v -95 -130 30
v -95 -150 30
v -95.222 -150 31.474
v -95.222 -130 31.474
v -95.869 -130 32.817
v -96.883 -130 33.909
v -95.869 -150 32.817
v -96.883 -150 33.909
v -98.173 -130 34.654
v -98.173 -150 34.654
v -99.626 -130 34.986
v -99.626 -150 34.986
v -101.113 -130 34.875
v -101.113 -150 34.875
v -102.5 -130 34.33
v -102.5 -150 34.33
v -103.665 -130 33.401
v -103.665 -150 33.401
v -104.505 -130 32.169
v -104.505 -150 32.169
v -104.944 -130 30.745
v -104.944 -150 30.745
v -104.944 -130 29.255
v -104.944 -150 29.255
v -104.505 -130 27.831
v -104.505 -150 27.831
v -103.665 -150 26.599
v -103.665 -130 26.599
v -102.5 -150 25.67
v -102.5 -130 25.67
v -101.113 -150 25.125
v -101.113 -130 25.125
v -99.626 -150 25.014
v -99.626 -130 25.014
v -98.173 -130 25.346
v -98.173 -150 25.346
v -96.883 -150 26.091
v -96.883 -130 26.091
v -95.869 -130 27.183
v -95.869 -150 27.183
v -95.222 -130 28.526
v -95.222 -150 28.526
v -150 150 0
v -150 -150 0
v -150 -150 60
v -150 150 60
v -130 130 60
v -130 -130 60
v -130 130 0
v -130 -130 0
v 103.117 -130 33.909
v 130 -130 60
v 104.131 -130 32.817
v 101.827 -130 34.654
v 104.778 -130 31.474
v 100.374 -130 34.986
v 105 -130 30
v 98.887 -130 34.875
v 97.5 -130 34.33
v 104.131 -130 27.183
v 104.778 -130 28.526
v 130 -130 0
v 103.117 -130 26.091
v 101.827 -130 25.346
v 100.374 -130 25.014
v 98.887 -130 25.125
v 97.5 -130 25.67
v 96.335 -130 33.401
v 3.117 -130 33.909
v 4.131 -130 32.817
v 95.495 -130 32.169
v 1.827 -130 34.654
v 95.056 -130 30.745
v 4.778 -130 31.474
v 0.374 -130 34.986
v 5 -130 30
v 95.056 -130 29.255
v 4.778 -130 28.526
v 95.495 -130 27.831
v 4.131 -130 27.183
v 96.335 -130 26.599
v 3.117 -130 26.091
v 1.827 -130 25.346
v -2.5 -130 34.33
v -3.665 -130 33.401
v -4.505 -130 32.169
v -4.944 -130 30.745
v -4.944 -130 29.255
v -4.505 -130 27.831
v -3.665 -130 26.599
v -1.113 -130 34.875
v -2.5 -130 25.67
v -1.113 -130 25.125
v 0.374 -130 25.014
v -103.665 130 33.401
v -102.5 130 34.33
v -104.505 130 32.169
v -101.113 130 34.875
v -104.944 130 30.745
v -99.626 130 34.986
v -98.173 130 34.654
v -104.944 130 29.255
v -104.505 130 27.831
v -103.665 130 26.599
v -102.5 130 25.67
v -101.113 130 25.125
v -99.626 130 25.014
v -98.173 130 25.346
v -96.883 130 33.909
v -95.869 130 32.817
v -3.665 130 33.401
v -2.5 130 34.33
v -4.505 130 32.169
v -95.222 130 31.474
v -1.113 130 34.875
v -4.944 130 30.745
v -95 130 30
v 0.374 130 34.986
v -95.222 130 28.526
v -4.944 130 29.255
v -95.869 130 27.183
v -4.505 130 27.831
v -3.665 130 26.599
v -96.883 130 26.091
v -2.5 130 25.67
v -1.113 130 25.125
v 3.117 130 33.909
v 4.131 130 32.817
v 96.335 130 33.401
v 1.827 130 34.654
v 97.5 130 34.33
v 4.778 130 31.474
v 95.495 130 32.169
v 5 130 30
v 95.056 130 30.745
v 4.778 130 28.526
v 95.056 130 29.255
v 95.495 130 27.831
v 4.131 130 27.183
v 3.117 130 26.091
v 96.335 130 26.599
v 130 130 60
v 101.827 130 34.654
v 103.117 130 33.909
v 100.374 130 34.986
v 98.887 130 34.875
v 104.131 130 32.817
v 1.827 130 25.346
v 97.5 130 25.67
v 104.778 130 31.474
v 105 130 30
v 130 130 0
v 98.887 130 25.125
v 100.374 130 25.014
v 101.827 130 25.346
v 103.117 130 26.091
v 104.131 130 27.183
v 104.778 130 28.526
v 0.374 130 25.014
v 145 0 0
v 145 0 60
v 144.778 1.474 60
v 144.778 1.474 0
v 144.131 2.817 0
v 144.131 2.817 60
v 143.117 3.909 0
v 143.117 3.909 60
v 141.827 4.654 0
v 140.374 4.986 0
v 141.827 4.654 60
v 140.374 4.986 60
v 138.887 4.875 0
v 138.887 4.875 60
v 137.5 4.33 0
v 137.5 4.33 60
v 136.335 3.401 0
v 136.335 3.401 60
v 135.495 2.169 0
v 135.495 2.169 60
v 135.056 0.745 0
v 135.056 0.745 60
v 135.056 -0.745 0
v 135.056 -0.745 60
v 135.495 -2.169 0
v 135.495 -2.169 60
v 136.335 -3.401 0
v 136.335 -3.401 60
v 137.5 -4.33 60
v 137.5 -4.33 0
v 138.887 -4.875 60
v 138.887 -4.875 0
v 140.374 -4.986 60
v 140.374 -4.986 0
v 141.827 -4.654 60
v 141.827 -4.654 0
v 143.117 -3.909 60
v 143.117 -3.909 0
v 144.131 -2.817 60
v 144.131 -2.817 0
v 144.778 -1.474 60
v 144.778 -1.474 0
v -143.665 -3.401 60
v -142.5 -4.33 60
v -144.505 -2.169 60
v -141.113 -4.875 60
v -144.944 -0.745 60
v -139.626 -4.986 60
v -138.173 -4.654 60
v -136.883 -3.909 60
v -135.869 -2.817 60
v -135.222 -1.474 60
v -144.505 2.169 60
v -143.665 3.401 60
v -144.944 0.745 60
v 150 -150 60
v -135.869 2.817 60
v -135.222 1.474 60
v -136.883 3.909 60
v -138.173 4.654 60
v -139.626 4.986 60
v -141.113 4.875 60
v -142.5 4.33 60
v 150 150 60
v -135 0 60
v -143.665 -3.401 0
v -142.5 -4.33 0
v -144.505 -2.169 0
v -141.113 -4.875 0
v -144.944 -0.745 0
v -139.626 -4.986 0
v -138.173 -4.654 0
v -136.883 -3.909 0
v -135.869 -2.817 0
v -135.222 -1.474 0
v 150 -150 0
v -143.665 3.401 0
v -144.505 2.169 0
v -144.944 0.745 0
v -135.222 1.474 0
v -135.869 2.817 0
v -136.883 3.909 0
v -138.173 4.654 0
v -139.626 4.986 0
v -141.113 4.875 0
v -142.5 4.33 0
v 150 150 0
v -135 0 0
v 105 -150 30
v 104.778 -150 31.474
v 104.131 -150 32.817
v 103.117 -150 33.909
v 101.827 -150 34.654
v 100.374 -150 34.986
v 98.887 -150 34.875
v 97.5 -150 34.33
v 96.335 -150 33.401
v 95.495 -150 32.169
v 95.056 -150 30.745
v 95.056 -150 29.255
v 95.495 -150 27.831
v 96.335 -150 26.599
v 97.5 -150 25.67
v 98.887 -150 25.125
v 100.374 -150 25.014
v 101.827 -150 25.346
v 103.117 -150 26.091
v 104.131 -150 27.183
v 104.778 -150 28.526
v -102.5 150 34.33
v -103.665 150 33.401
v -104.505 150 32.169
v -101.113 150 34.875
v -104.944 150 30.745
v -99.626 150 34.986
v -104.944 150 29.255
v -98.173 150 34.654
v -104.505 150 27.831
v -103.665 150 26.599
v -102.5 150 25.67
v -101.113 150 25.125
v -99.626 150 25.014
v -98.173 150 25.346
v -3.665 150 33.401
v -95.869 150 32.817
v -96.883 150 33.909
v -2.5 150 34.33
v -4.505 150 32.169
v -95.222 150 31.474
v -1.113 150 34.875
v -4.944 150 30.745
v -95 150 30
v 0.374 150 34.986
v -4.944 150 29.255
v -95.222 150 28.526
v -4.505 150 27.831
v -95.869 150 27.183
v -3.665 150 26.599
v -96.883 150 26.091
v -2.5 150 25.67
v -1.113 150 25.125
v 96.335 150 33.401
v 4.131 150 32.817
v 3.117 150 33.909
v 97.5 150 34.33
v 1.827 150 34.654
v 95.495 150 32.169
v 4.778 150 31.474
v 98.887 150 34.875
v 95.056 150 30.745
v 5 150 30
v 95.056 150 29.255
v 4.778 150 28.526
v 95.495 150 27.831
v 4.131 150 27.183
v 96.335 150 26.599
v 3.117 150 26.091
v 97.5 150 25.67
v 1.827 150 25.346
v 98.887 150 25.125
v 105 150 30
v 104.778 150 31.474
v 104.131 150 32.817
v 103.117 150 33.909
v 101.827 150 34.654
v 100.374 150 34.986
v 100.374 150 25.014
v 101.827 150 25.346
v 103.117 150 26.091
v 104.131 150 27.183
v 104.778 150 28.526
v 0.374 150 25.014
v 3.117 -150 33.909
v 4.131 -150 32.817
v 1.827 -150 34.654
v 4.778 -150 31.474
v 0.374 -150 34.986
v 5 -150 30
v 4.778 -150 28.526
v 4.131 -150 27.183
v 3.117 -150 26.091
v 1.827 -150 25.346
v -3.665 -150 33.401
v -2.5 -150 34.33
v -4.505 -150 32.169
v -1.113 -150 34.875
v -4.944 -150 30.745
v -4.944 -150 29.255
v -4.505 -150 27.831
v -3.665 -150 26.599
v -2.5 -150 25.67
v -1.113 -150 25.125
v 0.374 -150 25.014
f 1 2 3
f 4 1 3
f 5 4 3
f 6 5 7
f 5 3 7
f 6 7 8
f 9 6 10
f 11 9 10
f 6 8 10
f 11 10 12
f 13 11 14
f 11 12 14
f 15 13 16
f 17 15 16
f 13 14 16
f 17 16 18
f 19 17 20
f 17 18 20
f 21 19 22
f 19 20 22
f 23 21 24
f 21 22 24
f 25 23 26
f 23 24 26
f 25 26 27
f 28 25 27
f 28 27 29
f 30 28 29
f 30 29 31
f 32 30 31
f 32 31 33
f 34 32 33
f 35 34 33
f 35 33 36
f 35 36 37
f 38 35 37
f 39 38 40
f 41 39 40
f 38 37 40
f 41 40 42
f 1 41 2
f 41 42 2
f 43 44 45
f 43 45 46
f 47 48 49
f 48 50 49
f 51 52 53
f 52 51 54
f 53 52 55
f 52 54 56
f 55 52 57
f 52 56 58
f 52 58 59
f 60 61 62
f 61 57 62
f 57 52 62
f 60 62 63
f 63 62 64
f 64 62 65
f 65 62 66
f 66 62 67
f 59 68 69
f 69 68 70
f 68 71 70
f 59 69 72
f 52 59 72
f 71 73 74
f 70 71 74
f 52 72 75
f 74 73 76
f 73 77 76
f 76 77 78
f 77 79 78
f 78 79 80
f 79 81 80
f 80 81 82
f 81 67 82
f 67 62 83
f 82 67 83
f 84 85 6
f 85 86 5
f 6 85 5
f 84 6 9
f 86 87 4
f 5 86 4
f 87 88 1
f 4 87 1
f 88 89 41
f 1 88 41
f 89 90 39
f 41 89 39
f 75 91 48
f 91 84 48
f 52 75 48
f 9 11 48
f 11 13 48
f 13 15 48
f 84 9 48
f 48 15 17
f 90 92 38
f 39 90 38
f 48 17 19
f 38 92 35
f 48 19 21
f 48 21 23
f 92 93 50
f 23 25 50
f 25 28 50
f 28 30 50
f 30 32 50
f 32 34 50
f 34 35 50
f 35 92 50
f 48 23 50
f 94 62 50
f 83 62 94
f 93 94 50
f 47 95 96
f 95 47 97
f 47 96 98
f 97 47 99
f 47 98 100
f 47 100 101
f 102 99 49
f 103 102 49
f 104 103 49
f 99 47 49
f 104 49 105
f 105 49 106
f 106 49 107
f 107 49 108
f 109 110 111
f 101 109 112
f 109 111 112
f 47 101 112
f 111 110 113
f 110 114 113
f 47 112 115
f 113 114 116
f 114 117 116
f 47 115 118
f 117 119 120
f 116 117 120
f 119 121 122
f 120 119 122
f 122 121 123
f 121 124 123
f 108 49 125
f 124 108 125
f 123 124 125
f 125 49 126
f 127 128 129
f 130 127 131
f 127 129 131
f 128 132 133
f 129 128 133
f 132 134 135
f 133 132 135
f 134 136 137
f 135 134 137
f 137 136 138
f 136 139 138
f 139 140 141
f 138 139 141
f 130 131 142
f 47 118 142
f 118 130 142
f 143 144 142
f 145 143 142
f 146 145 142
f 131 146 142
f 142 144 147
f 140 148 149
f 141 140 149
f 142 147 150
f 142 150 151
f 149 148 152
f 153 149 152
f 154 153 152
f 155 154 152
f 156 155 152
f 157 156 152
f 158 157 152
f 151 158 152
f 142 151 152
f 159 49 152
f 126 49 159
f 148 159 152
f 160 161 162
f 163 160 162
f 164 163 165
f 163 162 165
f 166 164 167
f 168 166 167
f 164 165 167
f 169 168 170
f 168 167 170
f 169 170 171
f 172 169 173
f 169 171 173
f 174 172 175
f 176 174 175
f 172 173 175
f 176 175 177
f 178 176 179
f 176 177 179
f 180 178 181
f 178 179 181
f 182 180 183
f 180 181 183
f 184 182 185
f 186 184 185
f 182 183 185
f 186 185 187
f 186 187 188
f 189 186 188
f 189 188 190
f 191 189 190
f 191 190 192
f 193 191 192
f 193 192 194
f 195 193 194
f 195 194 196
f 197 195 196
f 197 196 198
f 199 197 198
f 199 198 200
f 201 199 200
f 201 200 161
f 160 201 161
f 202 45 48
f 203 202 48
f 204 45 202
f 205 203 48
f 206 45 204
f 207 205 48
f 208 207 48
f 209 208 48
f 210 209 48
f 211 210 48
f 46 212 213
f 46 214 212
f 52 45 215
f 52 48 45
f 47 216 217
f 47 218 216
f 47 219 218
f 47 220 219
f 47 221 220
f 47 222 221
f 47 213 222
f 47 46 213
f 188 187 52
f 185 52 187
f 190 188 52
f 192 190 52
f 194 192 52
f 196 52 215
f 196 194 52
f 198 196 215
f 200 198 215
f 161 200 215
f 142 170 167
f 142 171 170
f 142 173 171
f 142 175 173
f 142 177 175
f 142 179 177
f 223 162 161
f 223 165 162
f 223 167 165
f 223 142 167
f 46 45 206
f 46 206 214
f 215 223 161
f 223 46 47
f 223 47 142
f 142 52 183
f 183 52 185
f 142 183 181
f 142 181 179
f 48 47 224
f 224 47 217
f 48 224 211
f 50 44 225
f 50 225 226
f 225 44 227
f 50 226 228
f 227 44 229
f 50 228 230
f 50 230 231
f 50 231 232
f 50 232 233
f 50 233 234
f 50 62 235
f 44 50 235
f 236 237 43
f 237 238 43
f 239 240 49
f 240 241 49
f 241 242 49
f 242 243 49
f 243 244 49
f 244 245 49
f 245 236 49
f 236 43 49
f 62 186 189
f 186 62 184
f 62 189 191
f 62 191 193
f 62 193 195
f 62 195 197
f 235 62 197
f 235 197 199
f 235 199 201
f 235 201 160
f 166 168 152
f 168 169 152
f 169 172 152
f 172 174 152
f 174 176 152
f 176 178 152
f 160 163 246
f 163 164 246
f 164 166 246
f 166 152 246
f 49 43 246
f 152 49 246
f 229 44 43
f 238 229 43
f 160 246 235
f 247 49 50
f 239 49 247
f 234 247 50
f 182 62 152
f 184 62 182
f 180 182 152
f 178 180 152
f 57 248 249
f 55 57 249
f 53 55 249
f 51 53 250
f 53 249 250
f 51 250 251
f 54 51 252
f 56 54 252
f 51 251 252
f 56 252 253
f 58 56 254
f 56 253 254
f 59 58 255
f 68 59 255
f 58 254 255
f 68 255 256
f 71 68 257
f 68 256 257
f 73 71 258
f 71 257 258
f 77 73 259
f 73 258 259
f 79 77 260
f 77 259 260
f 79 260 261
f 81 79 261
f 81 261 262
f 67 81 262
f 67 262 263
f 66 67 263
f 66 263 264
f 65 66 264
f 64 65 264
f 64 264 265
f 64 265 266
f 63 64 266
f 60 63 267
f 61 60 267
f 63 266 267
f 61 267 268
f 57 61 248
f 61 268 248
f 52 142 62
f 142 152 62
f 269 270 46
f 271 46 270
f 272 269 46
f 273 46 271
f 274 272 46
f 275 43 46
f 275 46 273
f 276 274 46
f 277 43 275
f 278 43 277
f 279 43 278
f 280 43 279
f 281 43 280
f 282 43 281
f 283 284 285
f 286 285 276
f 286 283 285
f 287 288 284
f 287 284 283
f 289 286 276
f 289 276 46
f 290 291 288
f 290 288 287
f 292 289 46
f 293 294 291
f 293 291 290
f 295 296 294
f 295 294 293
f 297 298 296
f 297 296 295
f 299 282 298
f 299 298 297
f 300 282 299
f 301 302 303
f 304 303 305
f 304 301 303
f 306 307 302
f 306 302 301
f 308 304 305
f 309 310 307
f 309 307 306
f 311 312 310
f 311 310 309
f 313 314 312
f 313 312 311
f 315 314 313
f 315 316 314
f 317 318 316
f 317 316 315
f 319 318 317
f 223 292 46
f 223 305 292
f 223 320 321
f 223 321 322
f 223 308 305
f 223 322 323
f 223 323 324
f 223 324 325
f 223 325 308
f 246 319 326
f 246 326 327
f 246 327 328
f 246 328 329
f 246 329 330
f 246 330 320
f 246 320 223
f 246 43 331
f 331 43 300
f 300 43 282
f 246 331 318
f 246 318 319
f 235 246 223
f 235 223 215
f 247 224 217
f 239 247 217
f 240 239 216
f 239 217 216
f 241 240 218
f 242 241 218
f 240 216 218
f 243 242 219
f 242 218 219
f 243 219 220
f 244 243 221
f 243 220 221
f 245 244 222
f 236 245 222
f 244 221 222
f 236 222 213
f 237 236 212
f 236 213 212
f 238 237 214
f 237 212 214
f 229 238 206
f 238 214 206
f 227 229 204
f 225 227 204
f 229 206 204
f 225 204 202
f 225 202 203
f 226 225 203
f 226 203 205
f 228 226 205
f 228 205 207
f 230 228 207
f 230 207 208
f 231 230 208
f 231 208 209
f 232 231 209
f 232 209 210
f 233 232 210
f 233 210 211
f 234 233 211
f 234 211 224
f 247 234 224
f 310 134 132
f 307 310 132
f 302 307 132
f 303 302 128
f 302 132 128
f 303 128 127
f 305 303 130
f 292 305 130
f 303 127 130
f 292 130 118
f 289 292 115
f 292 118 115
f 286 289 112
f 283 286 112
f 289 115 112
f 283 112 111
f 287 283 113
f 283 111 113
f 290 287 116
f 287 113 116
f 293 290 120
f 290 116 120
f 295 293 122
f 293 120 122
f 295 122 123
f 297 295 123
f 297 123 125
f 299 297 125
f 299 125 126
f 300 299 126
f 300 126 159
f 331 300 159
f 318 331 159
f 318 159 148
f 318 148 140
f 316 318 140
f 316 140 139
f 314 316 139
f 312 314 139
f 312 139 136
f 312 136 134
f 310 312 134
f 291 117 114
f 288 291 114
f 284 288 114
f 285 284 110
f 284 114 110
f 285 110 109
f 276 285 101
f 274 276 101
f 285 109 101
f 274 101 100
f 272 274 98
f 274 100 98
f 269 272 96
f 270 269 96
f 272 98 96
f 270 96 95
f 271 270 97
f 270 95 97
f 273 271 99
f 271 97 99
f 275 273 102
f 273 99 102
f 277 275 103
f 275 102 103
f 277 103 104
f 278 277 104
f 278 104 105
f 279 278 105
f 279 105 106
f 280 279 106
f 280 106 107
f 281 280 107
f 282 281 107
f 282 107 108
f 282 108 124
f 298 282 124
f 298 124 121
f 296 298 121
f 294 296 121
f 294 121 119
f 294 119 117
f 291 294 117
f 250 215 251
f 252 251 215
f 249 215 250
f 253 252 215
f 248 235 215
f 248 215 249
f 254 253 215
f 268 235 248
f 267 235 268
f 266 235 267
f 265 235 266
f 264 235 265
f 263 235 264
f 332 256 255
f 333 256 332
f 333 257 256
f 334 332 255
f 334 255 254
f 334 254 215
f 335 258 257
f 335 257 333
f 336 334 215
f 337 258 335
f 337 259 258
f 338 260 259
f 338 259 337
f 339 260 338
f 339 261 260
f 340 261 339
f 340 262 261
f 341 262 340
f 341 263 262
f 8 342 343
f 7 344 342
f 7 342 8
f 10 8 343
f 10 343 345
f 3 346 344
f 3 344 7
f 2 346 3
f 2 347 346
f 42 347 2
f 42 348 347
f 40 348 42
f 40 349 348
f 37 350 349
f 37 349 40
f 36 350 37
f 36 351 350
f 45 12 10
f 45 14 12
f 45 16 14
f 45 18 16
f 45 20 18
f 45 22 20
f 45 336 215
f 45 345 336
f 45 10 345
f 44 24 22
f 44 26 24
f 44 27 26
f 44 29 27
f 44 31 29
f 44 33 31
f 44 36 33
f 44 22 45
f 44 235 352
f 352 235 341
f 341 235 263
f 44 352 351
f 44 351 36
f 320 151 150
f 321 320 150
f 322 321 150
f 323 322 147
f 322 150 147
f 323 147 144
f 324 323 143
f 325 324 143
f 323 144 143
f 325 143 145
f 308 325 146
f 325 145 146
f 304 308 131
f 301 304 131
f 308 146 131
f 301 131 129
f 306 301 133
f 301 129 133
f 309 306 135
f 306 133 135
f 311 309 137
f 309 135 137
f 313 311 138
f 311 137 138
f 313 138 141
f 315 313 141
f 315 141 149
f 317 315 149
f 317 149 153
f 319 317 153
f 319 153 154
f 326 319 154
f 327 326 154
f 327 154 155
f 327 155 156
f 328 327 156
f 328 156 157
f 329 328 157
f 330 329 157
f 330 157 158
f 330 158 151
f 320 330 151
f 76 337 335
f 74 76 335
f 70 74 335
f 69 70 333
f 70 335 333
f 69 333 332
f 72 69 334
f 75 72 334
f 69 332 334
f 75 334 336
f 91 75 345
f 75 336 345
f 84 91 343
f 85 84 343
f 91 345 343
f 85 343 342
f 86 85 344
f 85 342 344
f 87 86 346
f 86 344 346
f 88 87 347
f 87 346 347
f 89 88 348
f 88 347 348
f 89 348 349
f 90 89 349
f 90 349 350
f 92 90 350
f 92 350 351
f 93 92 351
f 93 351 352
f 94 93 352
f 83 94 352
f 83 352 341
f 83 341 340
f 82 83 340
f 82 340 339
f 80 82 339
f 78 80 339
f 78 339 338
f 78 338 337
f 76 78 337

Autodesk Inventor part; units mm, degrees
ref_plane "YZ Plane" through (0, 0, 0) normal (1, 0, 0) x (0, 1, 0)
ref_plane "XZ Plane" through (0, 0, 0) normal (0, 1, 0) x (-1, 0, 0)
ref_plane "XY Plane" through (0, 0, 0) normal (0, 0, 1) x (1, 0, 0)
sketch "Boceto1" plane through (0, 0, 0) normal (0, 0, 1) x (1, 0, 0)
  line L0 (-150, 150) -> (150, 150)
  line L1 (150, 150) -> (150, -150)
  line L2 (150, -150) -> (-150, -150)
  line L3 (-150, -150) -> (-150, 150)
  line L4 (-150, 150) -> (150, -150) construction
  line L5 (150, 150) -> (-150, -150) construction
  line L6 (130, -130) -> (-130, -130)
  line L7 (-130, -130) -> (-130, 130)
  line L8 (-130, 130) -> (130, 130)
  line L9 (130, 130) -> (130, -130)
  line L10 (130, -130) -> (-130, 130) construction
  line L11 (-130, -130) -> (130, 130) construction
  point P0 (0, 0)
  dimension "d2" = 300
  dimension "d3" = 300
  dimension "d20" = 20
extrude "Extrusión1" add sketch "Boceto1" along normal blind 60
sketch "Boceto3" plane through (-150, -150, 0) normal (0, -1, 0) x (1, 0, 0)
  circle A0 centre (150, 30) radius 5
  line L0 (0, 60) -> (300, 60) projected
  line L1 (0, 0) -> (0, 60) projected
  line L2 (20, 60) -> (280, 60) projected
  line L3 (150, 60) -> (150, 0) construction
  circle A1 centre (250, 30) radius 5
  circle A2 centre (50, 30) radius 5
  dimension "d21" = 10
  dimension "d24" = 30
  dimension "d25" = 150
  dimension "d26" = 10
  dimension "d27" = 30
  dimension "d28" = 100
  dimension "d29" = 10
  dimension "d30" = 100
  dimension "d31" = 30
extrude "Extrusión3" cut sketch "Boceto3" against normal up to surface (300 mm away)
sketch "Boceto4" plane through (0, 0, 60) normal (0, 0, 1) x (1, 0, 0)
  circle A0 centre (-140, 0) radius 5
  line L0 (-130, -130) -> (-130, 130) projected
  line L1 (-150, -150) -> (150, -150) projected
  circle A1 centre (140, 0) radius 5
  line L2 (130, 130) -> (130, -130) projected
  point P0 (0, 0)
  dimension "d32" = 10
  dimension "d33" = 10
  dimension "d34" = 150
  dimension "d35" = 10
  dimension "d36" = 150
  dimension "d37" = 10
extrude "Extrusión4" cut sketch "Boceto4" against normal through all
properties part number "IdeaBase"
